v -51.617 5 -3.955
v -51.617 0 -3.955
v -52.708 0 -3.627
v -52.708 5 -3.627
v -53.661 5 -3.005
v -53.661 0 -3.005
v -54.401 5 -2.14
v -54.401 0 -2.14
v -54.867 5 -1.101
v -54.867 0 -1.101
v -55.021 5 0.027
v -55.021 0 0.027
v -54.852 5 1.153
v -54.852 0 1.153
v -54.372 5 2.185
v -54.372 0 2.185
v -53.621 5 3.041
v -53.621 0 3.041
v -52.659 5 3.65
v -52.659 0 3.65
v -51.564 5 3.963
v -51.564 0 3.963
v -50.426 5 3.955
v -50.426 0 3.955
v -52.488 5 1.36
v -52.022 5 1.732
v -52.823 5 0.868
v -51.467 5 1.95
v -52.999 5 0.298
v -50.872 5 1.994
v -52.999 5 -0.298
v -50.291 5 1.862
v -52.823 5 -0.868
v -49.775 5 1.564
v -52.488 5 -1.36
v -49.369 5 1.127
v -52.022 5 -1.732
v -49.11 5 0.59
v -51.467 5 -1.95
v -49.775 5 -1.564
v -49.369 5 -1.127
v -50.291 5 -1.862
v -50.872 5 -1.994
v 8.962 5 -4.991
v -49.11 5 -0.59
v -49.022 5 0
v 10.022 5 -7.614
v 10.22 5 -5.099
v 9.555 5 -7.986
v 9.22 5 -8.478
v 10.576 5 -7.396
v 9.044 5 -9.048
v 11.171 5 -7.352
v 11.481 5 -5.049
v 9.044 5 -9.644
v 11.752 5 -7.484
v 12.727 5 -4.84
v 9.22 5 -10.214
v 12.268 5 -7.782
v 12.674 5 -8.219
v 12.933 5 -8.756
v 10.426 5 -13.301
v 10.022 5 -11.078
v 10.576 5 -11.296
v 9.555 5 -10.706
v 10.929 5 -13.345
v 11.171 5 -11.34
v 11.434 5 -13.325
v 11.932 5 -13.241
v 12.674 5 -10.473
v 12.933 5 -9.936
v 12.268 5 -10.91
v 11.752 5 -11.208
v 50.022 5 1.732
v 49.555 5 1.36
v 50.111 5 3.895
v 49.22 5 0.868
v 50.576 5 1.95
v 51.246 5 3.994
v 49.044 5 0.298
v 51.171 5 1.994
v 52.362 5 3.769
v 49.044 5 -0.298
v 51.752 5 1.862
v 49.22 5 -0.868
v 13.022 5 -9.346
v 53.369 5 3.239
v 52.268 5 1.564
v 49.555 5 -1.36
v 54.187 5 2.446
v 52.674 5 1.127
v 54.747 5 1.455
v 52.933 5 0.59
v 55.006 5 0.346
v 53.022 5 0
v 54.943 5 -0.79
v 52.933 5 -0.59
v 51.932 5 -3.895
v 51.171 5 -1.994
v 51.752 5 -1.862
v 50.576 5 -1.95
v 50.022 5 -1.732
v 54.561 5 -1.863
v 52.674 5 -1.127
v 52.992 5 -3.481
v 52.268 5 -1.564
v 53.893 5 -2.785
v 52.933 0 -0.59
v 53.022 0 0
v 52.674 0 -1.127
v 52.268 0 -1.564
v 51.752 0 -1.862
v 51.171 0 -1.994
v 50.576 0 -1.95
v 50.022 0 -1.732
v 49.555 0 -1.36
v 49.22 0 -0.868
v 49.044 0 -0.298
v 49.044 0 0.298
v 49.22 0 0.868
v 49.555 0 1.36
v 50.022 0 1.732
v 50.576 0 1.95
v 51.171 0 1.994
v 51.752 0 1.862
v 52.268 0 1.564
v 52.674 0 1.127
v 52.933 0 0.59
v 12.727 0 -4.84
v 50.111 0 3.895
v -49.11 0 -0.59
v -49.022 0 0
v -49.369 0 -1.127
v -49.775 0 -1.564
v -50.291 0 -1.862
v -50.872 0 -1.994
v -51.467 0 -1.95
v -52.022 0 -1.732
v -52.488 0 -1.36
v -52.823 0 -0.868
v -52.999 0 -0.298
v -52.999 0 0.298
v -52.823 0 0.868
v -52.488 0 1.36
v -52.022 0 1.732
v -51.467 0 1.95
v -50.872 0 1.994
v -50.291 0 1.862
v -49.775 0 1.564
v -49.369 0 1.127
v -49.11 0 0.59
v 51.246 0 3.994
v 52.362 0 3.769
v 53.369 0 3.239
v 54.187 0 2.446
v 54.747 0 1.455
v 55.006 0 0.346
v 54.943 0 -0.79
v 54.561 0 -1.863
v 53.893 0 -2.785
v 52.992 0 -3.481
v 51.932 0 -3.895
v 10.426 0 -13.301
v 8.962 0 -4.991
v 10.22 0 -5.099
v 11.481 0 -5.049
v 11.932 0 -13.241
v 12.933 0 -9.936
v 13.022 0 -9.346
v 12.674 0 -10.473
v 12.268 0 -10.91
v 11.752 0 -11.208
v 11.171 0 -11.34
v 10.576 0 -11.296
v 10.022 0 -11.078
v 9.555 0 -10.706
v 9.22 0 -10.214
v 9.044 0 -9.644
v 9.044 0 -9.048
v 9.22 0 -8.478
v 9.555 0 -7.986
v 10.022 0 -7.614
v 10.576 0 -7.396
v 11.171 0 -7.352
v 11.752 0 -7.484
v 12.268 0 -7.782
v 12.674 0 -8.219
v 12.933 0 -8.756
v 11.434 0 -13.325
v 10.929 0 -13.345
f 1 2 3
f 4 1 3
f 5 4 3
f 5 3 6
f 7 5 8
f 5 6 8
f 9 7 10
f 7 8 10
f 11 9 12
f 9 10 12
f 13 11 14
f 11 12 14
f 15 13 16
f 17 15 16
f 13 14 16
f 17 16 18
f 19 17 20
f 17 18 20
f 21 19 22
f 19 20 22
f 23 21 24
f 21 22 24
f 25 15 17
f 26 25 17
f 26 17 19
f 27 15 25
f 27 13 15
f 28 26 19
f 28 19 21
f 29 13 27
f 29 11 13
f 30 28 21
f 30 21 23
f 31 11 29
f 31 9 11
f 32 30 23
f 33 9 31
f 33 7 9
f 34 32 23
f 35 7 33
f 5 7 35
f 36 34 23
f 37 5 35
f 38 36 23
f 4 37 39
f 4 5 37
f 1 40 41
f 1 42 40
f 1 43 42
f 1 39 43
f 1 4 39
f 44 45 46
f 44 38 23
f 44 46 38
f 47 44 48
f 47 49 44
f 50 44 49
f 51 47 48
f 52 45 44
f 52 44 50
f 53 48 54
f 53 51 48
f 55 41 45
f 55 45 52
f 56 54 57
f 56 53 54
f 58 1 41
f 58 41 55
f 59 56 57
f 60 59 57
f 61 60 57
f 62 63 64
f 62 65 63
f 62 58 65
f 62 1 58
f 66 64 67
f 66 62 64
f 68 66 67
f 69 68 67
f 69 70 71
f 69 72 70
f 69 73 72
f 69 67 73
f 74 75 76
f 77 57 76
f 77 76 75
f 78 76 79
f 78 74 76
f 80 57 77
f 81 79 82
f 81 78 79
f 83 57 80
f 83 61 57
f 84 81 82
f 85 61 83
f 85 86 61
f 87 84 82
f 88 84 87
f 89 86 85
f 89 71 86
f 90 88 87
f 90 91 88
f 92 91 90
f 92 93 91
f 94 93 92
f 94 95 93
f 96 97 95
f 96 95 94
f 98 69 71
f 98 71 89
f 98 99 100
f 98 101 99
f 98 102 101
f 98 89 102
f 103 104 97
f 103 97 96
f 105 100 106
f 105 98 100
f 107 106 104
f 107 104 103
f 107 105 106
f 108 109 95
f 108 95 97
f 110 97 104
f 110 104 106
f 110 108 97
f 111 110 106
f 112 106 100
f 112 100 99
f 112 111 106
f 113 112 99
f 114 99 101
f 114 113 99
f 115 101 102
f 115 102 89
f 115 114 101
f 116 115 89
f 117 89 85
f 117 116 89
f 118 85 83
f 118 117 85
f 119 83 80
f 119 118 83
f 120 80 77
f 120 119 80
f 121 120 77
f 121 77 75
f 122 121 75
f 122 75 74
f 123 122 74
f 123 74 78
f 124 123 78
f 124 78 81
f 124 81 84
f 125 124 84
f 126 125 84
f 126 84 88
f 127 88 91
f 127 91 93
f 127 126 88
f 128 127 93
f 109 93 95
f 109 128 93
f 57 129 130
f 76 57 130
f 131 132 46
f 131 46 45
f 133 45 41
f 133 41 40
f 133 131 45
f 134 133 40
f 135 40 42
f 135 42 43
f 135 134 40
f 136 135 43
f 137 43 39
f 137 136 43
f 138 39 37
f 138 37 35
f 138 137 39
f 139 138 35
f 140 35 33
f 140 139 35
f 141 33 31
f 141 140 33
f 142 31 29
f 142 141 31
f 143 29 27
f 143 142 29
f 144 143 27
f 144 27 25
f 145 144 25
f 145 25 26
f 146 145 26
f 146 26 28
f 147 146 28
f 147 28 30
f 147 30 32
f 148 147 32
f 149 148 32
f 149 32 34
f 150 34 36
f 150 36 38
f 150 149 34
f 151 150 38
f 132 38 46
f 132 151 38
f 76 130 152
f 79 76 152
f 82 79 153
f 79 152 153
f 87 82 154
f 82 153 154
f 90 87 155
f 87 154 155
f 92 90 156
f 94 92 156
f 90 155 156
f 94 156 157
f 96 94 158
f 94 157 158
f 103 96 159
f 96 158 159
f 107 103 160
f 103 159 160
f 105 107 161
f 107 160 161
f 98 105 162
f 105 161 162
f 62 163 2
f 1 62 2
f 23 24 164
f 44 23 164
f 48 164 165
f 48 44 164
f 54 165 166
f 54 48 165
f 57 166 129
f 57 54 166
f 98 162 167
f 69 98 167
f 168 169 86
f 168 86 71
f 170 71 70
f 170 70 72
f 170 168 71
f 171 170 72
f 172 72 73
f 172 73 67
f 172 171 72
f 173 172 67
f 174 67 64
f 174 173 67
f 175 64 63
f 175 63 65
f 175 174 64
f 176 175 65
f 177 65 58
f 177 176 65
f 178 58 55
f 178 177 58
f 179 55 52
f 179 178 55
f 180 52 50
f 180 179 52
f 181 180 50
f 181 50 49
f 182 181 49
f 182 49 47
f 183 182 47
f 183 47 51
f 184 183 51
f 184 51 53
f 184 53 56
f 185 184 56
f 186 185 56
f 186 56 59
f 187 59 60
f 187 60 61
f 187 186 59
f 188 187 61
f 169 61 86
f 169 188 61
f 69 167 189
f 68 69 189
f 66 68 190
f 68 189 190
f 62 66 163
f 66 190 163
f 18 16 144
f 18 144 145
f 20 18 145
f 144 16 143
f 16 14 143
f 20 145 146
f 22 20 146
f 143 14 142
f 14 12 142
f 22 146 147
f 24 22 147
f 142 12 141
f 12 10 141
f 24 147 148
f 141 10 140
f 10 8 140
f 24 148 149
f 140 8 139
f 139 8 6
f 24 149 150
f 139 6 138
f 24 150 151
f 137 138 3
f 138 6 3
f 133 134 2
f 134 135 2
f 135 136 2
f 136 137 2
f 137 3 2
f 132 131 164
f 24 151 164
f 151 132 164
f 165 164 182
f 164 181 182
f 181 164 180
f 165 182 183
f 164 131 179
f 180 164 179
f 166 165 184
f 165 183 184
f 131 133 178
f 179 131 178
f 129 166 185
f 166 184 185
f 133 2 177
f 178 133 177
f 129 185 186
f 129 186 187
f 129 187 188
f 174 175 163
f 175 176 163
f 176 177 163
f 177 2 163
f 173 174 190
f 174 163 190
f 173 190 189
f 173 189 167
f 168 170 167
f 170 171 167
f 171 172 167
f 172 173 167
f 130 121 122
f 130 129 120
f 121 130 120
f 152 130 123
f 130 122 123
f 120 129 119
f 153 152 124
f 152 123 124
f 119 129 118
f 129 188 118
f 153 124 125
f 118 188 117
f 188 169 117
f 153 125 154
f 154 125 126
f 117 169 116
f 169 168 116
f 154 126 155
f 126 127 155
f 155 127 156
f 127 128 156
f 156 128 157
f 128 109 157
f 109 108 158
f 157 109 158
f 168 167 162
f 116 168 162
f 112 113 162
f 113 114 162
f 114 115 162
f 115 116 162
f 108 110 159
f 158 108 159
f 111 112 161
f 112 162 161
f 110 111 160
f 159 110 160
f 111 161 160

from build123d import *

# Parameters (mm, degrees)
SKETCH_1_R      = 2
EXTRUDE_1_DEPTH = 5
FILLET_2_R      = 10


with BuildPart() as part:
    # 草图1 → 凸台-拉伸1 (new body)
    with BuildSketch(Plane(origin=(0, 0, 0), x_dir=(1, 0, 0), z_dir=(0, 1, 0))):
        with BuildLine():
            Line((10.425672389, 13.301374756), (-51.617327611, 3.955374756))
            ThreePointArc((-51.617327611, 3.955374756), (-54.976874756, -0.595827611), (-50.425672389, -3.955374756))
            Line((-50.425672389, -3.955374756), (10.858587818, 5.276330608))
            Line((10.858587818, 5.276330608), (50.11141182, -3.89509172))
            ThreePointArc((50.11141182, -3.89509172), (54.91659172, -0.91008818), (51.93158818, 3.89509172))
            Line((51.93158818, 3.89509172), (11.93158818, 13.24109172))
            ThreePointArc((11.93158818, 13.24109172), (11.181495117, 13.342798914), (10.425672389, 13.301374756))
        make_face()
        with Locations((-51.0215, 0)):
            Circle(SKETCH_1_R, mode=Mode.SUBTRACT)
        with Locations((11.0215, 9.346)):
            Circle(SKETCH_1_R, mode=Mode.SUBTRACT)
        with Locations((51.0215, 0)):
            Circle(SKETCH_1_R, mode=Mode.SUBTRACT)
    extrude(amount=EXTRUDE_1_DEPTH)

    # 圆角2
    fillet_2_edges = [part.edges().sort_by_distance(p)[0] for p in [
        (10.858587818, 2.5, -5.276330608),
    ]]
    fillet(fillet_2_edges, radius=FILLET_2_R)


solid = part.part
